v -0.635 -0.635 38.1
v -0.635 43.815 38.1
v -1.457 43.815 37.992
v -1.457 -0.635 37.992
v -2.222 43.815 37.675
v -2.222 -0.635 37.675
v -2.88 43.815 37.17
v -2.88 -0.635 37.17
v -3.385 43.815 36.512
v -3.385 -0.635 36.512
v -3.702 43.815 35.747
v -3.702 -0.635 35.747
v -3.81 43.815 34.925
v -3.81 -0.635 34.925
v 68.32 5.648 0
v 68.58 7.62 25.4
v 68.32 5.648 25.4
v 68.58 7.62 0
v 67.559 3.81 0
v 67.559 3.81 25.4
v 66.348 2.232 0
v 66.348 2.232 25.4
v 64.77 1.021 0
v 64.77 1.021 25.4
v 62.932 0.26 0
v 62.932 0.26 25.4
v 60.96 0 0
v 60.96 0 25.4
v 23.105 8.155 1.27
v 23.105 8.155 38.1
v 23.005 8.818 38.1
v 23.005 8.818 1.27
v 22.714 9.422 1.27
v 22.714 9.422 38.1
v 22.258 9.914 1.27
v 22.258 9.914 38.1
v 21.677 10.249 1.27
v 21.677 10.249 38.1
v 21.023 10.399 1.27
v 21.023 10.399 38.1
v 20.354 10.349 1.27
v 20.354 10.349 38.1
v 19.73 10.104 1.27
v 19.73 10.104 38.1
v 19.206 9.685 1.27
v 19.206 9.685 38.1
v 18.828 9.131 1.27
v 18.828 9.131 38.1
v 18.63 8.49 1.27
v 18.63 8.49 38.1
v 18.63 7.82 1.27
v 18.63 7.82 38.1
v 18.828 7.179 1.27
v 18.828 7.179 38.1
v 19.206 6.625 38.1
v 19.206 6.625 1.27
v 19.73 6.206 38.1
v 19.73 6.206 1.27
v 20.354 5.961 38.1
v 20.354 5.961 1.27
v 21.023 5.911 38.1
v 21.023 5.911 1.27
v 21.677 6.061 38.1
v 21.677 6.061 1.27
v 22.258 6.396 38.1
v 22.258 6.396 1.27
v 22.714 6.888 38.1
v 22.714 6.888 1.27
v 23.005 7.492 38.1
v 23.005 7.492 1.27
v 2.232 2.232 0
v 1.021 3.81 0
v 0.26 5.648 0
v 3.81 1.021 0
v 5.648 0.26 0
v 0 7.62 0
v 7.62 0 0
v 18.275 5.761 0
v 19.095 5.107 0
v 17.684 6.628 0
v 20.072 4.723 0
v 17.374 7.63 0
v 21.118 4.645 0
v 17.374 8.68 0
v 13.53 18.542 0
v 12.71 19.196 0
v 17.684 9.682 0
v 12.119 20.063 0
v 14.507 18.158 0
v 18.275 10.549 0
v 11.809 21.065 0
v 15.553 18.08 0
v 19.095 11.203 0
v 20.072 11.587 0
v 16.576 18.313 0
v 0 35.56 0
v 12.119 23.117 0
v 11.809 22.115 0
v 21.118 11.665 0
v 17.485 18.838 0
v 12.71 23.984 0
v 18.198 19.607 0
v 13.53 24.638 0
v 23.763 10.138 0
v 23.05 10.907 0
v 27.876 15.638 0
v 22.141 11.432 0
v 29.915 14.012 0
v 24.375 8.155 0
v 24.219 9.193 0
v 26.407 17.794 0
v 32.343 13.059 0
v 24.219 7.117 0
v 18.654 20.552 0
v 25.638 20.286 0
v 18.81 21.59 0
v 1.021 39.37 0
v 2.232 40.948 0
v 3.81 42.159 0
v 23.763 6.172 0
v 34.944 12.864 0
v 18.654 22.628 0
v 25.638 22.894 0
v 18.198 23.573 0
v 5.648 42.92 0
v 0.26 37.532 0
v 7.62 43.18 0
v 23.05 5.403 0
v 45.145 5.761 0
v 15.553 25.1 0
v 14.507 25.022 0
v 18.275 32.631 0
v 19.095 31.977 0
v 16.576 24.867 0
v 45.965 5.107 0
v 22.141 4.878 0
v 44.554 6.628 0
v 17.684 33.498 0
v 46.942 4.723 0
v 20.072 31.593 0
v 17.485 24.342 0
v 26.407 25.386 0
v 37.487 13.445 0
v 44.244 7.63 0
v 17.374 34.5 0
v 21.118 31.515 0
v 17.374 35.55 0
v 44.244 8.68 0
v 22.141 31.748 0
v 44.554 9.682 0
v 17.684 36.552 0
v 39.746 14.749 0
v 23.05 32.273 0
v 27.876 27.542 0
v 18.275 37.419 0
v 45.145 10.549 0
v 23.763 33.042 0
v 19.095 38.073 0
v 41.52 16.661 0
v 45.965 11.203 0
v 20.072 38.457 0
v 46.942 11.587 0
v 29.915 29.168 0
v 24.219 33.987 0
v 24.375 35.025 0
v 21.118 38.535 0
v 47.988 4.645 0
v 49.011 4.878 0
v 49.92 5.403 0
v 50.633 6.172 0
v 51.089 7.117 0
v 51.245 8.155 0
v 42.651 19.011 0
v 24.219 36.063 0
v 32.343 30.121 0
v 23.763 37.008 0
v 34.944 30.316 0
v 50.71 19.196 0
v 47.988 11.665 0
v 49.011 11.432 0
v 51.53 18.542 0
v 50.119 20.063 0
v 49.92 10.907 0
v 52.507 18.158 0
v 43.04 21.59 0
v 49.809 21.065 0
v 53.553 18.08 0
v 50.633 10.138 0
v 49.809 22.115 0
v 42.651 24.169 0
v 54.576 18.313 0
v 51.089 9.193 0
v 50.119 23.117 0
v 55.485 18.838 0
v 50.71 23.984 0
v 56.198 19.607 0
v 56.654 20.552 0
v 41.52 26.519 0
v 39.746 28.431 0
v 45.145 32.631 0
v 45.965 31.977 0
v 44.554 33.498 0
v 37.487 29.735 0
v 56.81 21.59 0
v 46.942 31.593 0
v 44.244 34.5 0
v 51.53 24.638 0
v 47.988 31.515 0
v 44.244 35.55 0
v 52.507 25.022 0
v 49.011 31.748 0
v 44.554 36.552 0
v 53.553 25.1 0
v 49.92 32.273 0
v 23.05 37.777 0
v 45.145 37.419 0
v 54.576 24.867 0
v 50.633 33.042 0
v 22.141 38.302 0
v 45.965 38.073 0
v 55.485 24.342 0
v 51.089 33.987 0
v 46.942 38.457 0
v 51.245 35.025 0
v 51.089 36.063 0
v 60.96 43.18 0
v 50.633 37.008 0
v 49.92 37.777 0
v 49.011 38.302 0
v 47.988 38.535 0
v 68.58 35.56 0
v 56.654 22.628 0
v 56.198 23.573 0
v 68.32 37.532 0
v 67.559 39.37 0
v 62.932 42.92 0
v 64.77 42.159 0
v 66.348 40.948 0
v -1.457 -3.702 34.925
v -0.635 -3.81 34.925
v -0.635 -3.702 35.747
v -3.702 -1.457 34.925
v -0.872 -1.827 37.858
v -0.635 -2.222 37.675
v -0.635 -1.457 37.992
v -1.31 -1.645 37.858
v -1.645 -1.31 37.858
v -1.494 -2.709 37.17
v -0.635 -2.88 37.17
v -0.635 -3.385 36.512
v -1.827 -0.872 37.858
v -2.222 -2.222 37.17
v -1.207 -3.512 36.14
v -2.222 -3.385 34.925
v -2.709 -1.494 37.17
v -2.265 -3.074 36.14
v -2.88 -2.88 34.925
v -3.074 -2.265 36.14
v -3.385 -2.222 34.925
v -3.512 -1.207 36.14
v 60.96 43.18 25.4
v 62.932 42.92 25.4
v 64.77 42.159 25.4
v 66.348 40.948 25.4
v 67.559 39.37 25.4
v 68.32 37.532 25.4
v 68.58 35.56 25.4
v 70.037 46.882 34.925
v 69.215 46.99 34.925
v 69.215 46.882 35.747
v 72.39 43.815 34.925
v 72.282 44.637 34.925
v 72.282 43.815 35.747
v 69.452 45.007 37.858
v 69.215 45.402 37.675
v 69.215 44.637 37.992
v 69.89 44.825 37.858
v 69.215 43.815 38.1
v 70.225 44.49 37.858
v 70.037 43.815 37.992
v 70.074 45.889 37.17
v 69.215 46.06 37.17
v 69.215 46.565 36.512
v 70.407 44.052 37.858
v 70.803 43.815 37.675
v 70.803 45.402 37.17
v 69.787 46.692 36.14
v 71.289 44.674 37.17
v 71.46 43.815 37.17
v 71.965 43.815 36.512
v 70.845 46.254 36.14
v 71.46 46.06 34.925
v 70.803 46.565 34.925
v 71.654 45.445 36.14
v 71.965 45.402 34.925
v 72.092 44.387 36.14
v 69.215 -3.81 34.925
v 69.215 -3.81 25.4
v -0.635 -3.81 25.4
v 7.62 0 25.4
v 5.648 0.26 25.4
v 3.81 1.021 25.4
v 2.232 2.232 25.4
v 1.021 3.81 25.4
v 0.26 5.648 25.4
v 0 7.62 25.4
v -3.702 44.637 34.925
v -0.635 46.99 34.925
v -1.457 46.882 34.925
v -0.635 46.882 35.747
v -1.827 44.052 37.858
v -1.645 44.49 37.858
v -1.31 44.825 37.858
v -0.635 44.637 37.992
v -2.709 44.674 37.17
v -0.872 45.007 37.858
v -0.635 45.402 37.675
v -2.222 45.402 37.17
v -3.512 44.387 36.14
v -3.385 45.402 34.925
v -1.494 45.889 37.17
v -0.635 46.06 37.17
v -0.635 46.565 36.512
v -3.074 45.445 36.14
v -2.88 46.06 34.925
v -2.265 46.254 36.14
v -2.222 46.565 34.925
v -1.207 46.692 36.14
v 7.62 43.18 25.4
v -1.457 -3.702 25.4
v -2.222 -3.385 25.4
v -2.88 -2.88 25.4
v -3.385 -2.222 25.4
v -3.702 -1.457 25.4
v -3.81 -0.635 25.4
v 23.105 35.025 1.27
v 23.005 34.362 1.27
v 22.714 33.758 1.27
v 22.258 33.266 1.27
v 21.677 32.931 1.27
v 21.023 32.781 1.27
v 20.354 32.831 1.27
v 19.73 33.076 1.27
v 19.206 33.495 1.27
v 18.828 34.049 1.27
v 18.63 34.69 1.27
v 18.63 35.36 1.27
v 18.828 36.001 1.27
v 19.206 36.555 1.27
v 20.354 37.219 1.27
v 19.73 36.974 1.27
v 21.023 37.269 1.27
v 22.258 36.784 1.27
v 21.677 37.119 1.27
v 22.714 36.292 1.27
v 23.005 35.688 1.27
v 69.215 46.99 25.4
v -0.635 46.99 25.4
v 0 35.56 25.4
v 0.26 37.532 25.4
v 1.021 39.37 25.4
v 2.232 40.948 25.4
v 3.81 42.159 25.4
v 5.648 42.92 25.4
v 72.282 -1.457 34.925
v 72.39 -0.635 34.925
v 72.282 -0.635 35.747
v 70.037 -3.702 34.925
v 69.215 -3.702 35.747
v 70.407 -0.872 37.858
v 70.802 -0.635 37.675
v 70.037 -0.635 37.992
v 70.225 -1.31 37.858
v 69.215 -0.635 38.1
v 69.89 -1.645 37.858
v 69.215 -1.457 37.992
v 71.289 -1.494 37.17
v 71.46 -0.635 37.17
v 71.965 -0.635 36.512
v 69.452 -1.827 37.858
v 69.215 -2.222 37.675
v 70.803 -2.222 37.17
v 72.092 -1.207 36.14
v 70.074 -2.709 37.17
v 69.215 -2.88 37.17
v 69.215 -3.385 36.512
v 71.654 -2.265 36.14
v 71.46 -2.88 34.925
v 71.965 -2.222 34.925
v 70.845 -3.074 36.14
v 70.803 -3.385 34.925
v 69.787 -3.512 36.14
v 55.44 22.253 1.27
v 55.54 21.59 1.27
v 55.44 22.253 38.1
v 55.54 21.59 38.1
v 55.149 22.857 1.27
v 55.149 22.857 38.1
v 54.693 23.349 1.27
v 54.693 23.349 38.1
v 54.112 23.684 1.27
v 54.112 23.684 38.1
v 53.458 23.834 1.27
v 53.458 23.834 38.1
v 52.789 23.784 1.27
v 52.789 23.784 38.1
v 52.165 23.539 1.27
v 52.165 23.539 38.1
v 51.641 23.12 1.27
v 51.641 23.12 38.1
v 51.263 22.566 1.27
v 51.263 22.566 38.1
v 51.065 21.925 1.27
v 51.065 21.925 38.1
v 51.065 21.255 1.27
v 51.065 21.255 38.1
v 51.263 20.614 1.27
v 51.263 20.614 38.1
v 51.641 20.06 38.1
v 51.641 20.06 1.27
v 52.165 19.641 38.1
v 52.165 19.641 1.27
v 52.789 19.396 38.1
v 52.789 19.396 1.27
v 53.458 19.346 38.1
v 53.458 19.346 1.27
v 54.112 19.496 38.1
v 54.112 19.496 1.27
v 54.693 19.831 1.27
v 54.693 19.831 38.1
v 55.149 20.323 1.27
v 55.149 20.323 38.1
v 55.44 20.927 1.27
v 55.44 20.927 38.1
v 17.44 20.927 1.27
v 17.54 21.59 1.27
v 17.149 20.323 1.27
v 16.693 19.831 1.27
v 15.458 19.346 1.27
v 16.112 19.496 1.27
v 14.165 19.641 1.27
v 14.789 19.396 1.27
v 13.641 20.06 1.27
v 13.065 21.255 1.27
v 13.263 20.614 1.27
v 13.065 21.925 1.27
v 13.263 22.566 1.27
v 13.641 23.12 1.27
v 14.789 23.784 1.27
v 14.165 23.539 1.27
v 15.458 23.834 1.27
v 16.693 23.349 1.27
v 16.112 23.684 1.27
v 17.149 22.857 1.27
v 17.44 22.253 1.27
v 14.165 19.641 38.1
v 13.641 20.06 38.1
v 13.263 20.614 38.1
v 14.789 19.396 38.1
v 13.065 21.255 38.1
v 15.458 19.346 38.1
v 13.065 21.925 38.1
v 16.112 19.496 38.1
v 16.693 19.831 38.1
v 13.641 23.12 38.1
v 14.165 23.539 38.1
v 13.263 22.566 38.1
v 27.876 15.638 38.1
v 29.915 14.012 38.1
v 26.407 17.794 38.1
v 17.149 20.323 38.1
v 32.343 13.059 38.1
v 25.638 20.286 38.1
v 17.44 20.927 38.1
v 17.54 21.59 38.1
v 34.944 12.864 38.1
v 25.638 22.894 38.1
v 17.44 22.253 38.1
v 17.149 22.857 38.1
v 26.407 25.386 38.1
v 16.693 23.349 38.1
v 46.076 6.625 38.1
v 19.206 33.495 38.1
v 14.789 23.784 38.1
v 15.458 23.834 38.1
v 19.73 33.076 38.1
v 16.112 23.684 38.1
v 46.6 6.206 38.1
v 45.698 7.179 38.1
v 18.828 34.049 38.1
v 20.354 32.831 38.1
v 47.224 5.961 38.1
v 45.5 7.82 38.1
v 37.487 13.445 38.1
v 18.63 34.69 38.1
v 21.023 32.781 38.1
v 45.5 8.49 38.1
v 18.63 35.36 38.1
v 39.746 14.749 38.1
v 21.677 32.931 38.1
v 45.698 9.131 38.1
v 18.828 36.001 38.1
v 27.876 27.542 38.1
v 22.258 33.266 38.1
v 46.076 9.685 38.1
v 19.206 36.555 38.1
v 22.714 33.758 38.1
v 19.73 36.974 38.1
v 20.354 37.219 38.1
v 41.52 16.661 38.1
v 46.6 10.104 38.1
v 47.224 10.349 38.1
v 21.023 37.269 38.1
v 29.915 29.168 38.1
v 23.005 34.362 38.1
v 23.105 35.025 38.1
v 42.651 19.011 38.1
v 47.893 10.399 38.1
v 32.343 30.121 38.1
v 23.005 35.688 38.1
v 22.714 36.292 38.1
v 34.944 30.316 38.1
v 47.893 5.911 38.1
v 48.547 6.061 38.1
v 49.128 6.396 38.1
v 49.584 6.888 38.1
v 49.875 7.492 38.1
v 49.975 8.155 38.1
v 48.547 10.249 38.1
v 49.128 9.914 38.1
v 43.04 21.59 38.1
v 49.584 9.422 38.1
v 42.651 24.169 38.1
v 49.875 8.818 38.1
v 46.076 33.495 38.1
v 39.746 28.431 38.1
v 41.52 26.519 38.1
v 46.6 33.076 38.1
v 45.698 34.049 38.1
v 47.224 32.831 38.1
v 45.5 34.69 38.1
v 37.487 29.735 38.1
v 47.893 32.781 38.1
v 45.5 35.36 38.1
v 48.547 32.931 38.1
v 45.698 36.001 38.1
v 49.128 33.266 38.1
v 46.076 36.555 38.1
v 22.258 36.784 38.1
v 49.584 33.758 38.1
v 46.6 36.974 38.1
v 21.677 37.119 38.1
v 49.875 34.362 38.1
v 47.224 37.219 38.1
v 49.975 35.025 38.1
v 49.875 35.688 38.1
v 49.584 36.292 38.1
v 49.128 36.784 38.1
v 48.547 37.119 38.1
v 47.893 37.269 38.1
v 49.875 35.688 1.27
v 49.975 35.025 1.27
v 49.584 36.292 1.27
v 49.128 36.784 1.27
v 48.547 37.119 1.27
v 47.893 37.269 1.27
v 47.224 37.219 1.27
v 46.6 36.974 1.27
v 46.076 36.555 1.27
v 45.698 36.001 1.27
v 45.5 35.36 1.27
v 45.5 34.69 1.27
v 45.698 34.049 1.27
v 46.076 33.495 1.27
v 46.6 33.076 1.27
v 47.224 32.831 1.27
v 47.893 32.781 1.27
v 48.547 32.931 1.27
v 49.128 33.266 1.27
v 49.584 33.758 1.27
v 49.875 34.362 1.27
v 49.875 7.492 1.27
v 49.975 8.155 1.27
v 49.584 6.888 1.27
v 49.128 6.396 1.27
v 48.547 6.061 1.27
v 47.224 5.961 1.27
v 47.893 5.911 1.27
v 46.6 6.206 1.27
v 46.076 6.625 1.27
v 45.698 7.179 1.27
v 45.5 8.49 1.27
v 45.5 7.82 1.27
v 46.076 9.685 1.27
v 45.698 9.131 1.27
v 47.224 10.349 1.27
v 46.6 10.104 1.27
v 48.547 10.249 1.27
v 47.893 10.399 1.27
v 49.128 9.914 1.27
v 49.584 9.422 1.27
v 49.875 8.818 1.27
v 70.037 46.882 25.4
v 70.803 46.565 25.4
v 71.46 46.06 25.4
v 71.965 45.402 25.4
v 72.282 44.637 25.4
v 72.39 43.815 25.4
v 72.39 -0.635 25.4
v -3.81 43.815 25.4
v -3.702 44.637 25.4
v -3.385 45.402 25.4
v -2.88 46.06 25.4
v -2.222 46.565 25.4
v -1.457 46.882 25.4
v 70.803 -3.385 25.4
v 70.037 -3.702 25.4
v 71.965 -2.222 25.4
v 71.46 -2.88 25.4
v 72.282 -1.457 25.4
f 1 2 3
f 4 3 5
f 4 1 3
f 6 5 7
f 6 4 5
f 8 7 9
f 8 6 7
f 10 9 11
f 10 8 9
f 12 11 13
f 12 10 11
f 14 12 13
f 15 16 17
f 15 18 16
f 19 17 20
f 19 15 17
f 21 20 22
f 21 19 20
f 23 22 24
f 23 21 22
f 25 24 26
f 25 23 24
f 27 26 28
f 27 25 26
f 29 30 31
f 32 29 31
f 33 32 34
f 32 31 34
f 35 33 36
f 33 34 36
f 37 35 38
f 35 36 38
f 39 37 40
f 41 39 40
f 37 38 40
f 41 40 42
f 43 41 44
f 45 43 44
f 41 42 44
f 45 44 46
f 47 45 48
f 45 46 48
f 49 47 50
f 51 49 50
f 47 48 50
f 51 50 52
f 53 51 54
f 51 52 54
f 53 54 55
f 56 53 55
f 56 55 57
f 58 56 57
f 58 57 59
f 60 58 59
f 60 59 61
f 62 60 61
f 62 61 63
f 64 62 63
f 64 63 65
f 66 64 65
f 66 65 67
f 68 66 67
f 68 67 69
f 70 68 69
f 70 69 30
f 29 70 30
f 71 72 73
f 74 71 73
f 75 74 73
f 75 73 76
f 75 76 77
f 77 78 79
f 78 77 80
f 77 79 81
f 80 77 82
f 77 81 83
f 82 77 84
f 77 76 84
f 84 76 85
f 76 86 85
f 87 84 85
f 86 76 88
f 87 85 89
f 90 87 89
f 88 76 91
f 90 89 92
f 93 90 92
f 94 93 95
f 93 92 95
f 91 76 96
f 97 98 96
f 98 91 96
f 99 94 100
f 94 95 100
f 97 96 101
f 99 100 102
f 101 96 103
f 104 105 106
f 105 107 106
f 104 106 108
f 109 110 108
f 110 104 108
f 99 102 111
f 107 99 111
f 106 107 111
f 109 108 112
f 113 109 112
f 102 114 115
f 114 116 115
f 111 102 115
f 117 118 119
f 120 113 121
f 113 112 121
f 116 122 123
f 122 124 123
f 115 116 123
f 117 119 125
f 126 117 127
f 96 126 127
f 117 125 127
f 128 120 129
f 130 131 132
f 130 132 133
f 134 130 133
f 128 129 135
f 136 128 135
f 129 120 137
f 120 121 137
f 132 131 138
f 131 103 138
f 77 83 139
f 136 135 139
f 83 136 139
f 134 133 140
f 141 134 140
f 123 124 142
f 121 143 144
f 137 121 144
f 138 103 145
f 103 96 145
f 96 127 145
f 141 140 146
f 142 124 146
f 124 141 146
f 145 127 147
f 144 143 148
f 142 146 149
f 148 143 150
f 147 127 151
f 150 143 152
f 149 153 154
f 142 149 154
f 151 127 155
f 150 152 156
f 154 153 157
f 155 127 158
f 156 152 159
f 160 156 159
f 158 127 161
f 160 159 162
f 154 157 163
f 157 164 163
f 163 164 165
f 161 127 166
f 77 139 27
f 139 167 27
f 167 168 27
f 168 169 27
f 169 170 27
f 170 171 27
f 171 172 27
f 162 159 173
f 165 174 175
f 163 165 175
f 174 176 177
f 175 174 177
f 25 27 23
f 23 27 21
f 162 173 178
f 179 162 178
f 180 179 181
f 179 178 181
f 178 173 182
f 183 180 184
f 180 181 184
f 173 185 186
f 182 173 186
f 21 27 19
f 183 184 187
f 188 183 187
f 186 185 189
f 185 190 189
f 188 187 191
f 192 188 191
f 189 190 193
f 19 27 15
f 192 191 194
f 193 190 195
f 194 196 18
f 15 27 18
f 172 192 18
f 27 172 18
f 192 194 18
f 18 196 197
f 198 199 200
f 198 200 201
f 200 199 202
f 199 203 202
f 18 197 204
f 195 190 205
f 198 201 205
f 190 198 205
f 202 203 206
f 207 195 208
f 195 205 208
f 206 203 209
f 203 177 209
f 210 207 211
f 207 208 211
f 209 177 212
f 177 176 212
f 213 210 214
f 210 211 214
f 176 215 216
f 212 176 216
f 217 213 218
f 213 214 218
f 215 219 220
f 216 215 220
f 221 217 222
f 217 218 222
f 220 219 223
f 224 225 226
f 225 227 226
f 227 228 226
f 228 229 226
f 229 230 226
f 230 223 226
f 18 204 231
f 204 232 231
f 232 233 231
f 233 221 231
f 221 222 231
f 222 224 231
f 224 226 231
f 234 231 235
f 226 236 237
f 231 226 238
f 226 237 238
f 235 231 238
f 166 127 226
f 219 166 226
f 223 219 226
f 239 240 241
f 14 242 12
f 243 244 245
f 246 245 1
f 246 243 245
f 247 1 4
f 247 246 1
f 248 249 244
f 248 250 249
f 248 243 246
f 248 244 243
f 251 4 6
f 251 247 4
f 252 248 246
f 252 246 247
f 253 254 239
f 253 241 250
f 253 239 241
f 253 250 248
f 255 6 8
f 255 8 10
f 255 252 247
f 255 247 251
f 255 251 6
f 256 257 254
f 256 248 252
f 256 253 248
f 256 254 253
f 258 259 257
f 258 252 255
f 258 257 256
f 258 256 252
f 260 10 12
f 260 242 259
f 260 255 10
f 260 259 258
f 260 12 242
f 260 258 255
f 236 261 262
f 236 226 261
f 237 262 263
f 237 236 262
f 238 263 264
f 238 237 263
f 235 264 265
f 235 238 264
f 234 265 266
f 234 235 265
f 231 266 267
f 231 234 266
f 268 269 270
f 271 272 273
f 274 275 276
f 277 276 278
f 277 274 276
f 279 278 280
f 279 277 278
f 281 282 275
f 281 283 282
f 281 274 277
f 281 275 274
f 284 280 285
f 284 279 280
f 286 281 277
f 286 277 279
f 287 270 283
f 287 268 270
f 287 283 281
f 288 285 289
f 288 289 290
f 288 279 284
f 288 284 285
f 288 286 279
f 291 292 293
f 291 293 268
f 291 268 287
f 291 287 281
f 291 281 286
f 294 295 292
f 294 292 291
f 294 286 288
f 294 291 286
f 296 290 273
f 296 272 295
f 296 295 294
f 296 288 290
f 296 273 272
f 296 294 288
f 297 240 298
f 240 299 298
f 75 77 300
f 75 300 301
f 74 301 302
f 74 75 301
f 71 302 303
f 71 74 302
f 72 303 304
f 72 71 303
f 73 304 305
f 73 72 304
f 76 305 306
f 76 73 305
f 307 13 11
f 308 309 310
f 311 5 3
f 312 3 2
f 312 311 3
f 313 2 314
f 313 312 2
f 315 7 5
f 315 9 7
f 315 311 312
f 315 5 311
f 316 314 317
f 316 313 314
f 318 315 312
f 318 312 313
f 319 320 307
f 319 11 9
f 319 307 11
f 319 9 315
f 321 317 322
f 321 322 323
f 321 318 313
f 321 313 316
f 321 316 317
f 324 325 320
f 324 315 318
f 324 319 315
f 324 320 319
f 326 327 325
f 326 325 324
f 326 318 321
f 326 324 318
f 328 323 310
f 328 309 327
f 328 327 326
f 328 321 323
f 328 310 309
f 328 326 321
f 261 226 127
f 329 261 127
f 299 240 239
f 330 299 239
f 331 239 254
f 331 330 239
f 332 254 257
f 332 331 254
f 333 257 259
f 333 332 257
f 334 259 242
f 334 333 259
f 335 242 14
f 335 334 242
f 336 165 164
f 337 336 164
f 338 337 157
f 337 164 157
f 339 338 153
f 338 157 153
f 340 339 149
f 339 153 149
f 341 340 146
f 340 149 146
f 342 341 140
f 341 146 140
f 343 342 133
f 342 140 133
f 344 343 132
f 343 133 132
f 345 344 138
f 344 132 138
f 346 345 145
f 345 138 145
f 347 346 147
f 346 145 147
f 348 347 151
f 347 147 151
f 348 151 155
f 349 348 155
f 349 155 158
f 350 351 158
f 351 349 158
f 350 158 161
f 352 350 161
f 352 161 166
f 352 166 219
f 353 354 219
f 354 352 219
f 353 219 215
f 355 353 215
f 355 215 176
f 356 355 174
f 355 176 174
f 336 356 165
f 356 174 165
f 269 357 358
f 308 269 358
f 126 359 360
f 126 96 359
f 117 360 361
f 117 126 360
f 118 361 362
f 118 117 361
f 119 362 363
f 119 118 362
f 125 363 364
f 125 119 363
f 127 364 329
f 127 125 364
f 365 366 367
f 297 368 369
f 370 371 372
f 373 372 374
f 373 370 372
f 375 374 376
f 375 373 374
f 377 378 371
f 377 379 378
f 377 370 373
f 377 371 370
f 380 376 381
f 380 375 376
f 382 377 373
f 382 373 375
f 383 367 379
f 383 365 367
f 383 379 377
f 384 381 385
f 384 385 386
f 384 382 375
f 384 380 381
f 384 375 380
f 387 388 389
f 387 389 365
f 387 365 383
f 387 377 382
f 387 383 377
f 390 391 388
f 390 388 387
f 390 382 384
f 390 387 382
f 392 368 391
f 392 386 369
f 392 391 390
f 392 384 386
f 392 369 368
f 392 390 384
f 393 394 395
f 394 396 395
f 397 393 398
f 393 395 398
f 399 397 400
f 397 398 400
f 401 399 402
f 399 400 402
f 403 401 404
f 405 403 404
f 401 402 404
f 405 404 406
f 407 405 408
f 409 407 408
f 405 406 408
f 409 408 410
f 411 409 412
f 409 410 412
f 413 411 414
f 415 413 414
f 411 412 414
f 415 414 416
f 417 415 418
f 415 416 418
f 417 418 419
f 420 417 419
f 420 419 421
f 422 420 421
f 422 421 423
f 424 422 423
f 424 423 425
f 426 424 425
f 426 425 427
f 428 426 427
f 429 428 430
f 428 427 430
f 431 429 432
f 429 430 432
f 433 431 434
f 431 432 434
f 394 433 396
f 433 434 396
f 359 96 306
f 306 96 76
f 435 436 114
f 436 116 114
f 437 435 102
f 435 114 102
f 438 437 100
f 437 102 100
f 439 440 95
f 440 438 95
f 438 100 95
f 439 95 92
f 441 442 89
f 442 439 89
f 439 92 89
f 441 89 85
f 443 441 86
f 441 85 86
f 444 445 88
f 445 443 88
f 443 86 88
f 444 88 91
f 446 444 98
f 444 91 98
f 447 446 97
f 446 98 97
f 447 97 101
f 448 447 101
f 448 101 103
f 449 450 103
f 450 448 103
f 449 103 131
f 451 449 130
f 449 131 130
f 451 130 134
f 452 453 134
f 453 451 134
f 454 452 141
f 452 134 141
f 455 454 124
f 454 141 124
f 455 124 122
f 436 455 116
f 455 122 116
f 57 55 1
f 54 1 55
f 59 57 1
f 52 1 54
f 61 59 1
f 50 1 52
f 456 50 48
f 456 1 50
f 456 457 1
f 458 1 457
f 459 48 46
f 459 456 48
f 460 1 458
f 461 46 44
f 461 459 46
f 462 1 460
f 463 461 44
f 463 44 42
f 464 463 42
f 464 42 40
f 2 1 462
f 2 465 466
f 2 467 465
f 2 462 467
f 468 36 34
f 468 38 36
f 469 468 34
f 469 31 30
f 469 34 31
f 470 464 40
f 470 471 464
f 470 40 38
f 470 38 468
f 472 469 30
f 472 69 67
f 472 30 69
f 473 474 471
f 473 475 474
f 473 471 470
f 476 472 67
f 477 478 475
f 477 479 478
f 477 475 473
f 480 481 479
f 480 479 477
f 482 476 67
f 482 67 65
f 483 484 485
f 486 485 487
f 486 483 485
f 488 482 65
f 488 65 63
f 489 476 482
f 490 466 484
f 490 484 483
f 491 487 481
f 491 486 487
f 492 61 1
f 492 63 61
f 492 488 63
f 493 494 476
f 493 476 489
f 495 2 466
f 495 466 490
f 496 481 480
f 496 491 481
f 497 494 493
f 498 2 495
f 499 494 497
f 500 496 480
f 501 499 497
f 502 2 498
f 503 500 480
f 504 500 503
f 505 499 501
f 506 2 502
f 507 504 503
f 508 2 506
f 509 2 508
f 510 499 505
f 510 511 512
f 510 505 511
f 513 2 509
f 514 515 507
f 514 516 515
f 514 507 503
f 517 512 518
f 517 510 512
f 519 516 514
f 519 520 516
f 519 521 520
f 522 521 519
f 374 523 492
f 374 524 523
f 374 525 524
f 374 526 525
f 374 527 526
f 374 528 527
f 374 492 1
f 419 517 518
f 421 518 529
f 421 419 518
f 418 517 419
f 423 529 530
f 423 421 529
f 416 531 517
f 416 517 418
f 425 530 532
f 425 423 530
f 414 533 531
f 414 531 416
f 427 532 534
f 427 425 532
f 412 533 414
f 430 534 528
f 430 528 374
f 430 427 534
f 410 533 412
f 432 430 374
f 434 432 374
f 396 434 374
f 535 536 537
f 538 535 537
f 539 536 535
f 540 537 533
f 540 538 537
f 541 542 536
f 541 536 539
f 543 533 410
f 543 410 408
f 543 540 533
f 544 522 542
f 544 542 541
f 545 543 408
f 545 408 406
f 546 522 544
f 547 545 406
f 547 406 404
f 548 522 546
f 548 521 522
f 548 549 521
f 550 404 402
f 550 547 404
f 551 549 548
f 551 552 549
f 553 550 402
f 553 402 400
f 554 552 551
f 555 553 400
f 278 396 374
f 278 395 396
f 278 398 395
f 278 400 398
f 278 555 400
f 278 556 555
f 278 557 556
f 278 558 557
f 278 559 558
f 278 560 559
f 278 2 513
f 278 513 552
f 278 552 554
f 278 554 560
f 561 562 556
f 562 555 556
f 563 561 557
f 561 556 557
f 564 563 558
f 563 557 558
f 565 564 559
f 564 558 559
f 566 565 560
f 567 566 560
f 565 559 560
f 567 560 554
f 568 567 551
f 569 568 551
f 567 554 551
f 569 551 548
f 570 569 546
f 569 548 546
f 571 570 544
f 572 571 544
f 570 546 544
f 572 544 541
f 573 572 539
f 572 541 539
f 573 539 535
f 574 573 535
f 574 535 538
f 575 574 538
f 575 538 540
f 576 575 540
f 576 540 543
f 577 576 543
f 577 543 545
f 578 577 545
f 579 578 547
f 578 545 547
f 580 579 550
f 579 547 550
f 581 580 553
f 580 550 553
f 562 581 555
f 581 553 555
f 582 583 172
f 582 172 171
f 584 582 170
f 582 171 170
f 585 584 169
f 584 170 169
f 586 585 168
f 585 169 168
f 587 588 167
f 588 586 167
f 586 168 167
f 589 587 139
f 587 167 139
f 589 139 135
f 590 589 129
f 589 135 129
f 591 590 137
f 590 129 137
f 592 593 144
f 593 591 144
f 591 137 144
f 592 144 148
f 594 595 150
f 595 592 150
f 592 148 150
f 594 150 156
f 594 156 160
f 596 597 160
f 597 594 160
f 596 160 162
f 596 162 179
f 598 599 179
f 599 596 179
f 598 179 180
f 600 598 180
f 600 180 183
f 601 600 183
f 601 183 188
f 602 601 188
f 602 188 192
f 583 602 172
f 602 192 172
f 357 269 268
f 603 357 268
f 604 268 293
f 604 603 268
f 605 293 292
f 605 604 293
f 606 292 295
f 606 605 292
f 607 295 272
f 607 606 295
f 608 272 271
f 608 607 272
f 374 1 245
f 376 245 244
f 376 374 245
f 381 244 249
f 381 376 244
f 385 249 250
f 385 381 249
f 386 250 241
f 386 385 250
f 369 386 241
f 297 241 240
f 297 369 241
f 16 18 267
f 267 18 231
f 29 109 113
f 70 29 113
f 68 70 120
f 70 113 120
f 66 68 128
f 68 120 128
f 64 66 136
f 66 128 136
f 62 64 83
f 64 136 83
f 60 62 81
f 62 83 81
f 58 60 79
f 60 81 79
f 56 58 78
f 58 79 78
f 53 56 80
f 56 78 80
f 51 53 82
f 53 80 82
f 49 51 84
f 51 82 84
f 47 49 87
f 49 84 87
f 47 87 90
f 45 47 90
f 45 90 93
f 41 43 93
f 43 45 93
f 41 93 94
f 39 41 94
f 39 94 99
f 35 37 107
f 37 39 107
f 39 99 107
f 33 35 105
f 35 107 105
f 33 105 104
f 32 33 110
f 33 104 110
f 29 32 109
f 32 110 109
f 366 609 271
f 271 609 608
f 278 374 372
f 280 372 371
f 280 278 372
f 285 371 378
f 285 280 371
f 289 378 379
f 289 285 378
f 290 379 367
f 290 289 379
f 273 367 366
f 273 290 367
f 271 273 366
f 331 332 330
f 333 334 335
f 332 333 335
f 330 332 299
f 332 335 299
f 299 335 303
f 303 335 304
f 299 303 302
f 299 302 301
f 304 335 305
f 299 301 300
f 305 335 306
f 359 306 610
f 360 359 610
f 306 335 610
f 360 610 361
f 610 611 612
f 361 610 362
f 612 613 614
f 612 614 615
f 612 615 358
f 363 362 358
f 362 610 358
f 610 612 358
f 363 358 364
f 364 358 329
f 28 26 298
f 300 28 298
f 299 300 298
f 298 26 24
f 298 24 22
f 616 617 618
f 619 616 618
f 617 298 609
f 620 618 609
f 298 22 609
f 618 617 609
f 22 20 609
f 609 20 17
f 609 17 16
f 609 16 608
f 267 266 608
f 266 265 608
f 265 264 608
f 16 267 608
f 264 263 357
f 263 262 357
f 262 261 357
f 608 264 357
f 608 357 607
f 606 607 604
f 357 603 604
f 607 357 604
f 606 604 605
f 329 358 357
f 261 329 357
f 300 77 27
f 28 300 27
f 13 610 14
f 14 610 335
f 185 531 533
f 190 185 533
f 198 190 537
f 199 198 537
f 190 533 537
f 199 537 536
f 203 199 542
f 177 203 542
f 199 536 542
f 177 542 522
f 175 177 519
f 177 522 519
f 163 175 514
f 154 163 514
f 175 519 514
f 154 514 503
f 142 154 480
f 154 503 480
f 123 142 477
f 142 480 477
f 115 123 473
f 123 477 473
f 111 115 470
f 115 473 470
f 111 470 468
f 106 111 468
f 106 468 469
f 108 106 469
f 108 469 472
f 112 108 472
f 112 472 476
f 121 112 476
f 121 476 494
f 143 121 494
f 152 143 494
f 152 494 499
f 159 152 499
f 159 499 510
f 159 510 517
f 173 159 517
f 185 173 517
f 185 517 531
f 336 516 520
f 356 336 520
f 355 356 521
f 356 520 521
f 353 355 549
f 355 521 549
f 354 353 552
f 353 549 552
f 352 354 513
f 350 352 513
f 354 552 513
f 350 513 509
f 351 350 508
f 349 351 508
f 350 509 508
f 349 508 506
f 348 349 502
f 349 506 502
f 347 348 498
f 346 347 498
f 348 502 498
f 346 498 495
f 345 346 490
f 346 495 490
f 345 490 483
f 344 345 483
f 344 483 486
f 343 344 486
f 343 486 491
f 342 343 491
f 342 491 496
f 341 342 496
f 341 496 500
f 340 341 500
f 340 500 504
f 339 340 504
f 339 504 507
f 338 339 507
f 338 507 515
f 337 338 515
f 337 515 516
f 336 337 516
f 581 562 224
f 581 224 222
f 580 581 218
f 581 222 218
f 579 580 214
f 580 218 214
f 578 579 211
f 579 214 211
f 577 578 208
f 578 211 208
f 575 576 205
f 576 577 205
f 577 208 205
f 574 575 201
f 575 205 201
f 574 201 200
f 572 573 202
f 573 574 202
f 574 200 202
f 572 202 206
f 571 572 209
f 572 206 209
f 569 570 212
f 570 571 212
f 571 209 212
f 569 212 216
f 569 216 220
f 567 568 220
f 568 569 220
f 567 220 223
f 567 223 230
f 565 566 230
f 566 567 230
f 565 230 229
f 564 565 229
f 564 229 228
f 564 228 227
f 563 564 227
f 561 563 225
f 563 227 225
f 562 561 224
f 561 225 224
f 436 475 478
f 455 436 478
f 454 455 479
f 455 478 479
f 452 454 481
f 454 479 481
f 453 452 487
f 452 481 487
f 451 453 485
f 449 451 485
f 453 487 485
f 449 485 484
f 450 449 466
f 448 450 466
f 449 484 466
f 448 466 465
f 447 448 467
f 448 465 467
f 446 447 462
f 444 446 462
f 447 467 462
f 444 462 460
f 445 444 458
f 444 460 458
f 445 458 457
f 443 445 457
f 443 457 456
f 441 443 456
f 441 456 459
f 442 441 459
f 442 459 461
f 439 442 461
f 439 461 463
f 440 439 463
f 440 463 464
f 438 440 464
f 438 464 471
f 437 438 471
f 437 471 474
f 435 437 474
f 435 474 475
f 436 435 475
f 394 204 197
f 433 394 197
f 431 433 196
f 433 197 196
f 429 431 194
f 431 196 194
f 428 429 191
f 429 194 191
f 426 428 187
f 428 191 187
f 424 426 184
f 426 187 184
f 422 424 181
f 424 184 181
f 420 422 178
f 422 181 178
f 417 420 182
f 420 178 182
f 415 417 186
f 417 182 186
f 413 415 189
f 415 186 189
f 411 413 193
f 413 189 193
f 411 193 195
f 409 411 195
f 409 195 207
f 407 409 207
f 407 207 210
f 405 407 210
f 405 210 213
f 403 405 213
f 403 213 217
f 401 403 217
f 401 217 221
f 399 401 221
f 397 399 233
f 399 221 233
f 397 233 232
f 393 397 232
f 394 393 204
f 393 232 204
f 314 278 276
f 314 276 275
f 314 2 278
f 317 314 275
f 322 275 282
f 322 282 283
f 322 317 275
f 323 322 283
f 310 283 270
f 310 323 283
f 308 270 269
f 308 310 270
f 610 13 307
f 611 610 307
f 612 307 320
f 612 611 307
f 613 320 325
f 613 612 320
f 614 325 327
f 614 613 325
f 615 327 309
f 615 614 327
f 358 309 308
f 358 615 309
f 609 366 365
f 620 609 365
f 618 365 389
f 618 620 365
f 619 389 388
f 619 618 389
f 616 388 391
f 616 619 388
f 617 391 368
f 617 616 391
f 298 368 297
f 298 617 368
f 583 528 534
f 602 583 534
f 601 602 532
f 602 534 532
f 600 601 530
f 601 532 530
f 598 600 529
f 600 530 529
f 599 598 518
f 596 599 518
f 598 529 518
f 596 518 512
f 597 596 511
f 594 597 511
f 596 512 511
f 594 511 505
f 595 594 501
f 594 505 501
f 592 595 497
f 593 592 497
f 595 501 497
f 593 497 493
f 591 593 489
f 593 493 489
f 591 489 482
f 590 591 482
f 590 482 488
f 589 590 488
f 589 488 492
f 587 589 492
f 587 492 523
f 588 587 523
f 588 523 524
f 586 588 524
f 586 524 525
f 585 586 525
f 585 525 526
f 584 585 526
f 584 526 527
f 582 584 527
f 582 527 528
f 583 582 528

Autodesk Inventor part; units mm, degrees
ref_plane "YZ Plane" through (0, 0, 0) normal (1, 0, 0) x (0, 1, 0)
ref_plane "XZ Plane" through (0, 0, 0) normal (0, 1, 0) x (-1, 0, 0)
ref_plane "XY Plane" through (0, 0, 0) normal (0, 0, 1) x (1, 0, 0)
sketch "Sketch1" plane through (0, 0, 0) normal (0, 0, 1) x (1, 0, 0)
  line L0 (7.62, 0) -> (60.96, 0)
  line L1 (68.58, 7.62) -> (68.58, 35.56)
  line L2 (60.96, 43.18) -> (7.62, 43.18)
  line L3 (0, 35.56) -> (0, 7.62)
  arc A0 (7.62, 43.18) -> (0, 35.56) centre (7.62, 35.56) ccw
  arc A1 (0, 7.62) -> (7.62, 0) centre (7.62, 7.62) ccw
  arc A2 (60.96, 0) -> (68.58, 7.62) centre (60.96, 7.62) ccw
  arc A3 (68.58, 35.56) -> (60.96, 43.18) centre (60.96, 35.56) ccw
  point P0 (0, 0)
  point P1 (68.58, 43.18)
  point P2 (68.58, 0)
  point P3 (0, 43.18)
  dimension "d0" = 68.58
  dimension "d1" = 43.18
  dimension "d2" = 7.62
extrude "Extrusion1" add sketch "Sketch1" along normal blind 25.4
sketch "Sketch2" plane through (0, 0, 25.4) normal (0, 0, 1) x (1, 0, 0)
  line L0 (-0.635, -3.81) -> (69.215, -3.81)
  line L1 (72.39, -0.635) -> (72.39, 43.815)
  line L2 (69.215, 46.99) -> (-0.635, 46.99)
  line L3 (-3.81, 43.815) -> (-3.81, -0.635)
  arc A0 (-0.635, 46.99) -> (-3.81, 43.815) centre (-0.635, 43.815) ccw
  arc A1 (-3.81, -0.635) -> (-0.635, -3.81) centre (-0.635, -0.635) ccw
  arc A2 (69.215, -3.81) -> (72.39, -0.635) centre (69.215, -0.635) ccw
  arc A3 (72.39, 43.815) -> (69.215, 46.99) centre (69.215, 43.815) ccw
  line L4 (60.96, 43.18) -> (7.62, 43.18) construction
  line L5 (0, 35.56) -> (0, 7.62) construction
  point P0 (0, 0)
  point P1 (72.39, 46.99)
  point P2 (72.39, -3.81)
  point P3 (-3.81, 46.99)
  point P4 (34.29, 46.99)
  point P5 (34.29, 43.18)
  point P6 (-3.81, 21.59)
  point P7 (0, 21.59)
  dimension "d5" = 76.2
  dimension "d6" = 50.8
  dimension "d7" = 3.175
extrude "Extrusion2" add sketch "Sketch2" along normal blind 12.7
fillet "Fillet1" radius 3.175 8 edges at (-2.8801, 46.0601, 38.1) (-3.81, 21.59, 38.1) (-2.8801, -2.8801, 38.1) (34.29, -3.81, 38.1) (71.4601, -2.8801, 38.1) (72.39, 21.59, 38.1) (71.4601, 46.0601, 38.1) (34.29, 46.99, 38.1)
sketch "Sketch3" plane through (0, 0, 38.1) normal (0, 0, 1) x (1, 0, 0)
  line L0 (69.215, 46.99) -> (-0.635, 46.99) construction
  line L1 (69.215, 46.99) -> (-0.635, 46.99) construction
  line L2 (-3.81, 43.815) -> (-3.81, -0.635) construction
  line L3 (-3.81, 43.815) -> (-3.81, -0.635) construction
  circle A0 centre (34.29, 21.59) radius 8.75
  circle A1 centre (34.29, 21.59) radius 19 construction
  circle A2 centre (20.855, 35.025) radius 2.25
  circle A3 centre (47.725, 35.025) radius 2.25
  circle A4 centre (15.29, 21.59) radius 2.25
  circle A5 centre (53.29, 21.59) radius 2.25
  circle A6 centre (20.855, 8.155) radius 2.25
  circle A7 centre (47.725, 8.155) radius 2.25
  line L4 (20.855, 35.025) -> (34.29, 21.59) construction
  line L5 (34.29, 21.59) -> (15.29, 21.59) construction
  point P0 (0, 0)
  point P1 (34.29, 46.99)
  point P2 (-3.81, 21.59)
  point P3 (-3.81, 21.59)
  dimension "d11" = 17.5
  dimension "d14" = 4.5
  dimension "d15" = 38
  dimension "d16" = 45
extrude "Extrusion3" cut sketch "Sketch3" against normal up to surface (38.1 mm away)
chamfer "Chamfer1" distance 1.27 angle 45 6 edges at (45.475, 35.025, 0) (18.605, 35.025, 0) (13.04, 21.59, 0) (51.04, 21.59, 0) (45.475, 8.155, 0) (18.605, 8.155, 0)
properties part number "2x3_Spacer_Rear"
